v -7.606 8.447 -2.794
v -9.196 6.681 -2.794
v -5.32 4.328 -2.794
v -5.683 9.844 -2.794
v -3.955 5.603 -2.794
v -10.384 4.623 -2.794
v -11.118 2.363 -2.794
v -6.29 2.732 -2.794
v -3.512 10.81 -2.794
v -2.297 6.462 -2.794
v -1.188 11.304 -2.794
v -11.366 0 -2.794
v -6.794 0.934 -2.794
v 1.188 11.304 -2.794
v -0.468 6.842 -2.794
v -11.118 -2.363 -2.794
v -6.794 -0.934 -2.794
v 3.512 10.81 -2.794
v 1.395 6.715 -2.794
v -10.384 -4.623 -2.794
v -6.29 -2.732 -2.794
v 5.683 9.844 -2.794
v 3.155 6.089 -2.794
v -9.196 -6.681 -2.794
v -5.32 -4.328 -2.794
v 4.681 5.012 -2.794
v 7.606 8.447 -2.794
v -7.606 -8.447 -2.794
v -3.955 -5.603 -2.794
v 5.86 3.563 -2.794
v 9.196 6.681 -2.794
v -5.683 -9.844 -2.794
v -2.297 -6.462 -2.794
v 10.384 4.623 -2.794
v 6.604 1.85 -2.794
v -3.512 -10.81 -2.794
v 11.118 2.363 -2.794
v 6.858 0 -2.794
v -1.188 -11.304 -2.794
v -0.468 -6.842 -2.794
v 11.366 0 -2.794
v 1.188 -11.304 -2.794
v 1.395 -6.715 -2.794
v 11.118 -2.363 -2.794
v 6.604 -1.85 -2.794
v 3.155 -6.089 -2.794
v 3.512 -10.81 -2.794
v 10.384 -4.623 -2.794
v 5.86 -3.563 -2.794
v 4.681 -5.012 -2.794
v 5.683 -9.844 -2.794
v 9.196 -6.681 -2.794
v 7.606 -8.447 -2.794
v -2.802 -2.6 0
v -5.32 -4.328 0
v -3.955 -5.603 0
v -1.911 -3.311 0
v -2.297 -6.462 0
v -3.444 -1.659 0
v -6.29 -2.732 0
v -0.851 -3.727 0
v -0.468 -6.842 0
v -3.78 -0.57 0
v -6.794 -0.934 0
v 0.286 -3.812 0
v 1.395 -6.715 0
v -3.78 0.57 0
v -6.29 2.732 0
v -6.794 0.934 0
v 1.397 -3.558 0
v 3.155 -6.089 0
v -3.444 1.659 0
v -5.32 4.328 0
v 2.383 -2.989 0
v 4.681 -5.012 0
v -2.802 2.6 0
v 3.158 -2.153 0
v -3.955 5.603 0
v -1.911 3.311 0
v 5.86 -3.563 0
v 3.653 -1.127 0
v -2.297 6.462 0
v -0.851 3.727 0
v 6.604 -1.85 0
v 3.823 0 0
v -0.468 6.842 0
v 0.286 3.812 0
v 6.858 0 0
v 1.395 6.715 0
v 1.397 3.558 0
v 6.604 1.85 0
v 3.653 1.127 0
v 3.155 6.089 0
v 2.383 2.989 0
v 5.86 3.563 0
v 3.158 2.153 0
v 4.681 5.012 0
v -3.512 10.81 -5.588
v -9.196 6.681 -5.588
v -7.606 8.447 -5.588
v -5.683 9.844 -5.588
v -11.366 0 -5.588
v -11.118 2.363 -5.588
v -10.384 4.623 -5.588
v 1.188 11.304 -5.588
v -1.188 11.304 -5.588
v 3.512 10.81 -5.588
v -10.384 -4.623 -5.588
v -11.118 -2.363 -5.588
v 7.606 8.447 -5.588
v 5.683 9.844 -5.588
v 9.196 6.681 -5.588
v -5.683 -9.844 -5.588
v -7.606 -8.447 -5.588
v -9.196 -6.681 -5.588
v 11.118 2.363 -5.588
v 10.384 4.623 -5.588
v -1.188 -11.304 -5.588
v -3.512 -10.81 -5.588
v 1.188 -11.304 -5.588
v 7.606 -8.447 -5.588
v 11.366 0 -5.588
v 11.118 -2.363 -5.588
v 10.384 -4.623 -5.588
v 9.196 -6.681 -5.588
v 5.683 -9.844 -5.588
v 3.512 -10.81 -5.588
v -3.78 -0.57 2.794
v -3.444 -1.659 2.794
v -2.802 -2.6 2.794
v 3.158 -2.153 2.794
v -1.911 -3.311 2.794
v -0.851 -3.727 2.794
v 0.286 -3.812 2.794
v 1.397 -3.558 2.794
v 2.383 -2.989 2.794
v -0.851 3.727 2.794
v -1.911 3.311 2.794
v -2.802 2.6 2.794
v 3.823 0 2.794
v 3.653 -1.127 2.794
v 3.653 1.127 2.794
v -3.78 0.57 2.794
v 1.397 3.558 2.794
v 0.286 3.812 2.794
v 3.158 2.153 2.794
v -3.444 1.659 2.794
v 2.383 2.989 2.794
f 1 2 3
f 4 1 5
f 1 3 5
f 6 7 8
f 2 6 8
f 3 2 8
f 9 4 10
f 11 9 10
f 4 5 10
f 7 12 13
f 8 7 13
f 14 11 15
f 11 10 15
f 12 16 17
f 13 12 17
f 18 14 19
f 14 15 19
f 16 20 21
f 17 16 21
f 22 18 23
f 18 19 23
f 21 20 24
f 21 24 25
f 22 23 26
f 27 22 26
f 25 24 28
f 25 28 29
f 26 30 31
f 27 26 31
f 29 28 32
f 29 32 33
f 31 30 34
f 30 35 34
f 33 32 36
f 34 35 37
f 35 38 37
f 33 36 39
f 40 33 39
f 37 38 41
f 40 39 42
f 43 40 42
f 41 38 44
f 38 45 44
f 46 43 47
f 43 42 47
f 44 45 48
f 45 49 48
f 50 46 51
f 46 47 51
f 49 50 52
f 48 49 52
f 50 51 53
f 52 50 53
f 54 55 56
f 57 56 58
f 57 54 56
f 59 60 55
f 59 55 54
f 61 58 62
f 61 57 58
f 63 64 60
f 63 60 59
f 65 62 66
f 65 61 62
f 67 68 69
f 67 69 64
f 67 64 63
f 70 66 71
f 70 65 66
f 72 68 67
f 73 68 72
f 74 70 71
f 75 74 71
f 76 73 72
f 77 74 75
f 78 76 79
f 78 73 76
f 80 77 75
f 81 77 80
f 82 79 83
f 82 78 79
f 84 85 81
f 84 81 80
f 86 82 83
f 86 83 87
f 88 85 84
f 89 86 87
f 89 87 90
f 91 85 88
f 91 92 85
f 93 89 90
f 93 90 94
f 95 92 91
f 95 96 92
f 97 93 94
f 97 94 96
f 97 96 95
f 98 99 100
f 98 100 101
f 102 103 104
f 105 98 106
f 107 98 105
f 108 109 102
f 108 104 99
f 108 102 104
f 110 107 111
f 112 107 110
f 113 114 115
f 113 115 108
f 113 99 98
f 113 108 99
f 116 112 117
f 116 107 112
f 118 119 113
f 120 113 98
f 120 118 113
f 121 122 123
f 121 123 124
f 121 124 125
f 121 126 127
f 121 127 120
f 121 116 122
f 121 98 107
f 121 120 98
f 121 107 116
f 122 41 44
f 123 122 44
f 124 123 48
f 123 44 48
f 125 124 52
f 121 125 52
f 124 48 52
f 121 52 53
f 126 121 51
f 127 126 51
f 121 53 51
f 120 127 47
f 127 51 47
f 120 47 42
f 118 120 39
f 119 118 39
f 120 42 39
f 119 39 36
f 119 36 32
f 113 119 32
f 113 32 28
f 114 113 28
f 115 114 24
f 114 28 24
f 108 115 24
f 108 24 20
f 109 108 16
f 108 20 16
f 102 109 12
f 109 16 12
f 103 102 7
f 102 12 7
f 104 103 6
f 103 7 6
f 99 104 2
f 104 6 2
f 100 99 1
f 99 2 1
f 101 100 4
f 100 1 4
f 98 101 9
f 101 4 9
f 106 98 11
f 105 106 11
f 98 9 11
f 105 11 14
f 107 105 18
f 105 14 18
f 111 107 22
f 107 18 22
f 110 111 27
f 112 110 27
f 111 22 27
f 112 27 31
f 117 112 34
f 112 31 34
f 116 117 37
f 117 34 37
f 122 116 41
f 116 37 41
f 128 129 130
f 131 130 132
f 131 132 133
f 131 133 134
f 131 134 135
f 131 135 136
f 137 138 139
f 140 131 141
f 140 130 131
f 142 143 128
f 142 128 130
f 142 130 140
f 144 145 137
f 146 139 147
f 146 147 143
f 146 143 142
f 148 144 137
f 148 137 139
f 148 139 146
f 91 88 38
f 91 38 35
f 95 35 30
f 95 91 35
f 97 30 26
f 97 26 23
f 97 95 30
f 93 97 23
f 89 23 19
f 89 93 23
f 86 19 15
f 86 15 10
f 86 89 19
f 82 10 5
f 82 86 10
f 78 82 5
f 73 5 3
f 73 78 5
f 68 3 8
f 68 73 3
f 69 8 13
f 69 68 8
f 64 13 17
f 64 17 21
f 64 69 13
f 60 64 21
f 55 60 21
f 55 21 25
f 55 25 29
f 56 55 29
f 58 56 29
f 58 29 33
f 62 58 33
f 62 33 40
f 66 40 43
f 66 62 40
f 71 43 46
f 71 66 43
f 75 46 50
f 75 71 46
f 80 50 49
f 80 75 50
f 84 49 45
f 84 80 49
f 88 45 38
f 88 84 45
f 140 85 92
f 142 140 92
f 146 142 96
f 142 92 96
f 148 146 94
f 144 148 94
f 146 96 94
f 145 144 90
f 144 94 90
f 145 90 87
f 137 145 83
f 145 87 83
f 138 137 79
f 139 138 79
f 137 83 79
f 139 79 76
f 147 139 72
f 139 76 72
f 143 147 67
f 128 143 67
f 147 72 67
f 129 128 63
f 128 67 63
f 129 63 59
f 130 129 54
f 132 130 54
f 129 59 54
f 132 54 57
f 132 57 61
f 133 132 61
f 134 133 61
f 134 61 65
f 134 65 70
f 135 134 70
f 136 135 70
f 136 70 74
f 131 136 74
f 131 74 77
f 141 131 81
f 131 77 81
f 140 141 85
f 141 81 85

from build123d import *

# Parameters (mm, degrees)
F0_R     = 3.8227
F1_DEPTH = 2.794
F0_R_2   = 6.858
F2_DEPTH = 2.794
F3_R     = 11.3665
F3_R_2   = 6.858
F4_DEPTH = 2.794


with BuildPart() as f1:
    # F0 (on Top) → F1 (new body)
    with BuildSketch(Plane.XY):
        Circle(F0_R)
    extrude(amount=F1_DEPTH)

    # F0 (on Top) → F2 (join)
    with BuildSketch(Plane.XY):
        Circle(F0_R_2)
        Circle(F0_R, mode=Mode.SUBTRACT)
        Circle(F0_R)
    extrude(amount=-F2_DEPTH)

    # F3 (on face) → F4 (join)
    with BuildSketch(Plane(origin=(0, 0, -2.794), x_dir=(1, 0, 0), z_dir=(0, 0, -1))):
        Circle(F3_R)
        Circle(F3_R_2, mode=Mode.SUBTRACT)
        Circle(F3_R_2)
    extrude(amount=F4_DEPTH)


solid = f1.part
